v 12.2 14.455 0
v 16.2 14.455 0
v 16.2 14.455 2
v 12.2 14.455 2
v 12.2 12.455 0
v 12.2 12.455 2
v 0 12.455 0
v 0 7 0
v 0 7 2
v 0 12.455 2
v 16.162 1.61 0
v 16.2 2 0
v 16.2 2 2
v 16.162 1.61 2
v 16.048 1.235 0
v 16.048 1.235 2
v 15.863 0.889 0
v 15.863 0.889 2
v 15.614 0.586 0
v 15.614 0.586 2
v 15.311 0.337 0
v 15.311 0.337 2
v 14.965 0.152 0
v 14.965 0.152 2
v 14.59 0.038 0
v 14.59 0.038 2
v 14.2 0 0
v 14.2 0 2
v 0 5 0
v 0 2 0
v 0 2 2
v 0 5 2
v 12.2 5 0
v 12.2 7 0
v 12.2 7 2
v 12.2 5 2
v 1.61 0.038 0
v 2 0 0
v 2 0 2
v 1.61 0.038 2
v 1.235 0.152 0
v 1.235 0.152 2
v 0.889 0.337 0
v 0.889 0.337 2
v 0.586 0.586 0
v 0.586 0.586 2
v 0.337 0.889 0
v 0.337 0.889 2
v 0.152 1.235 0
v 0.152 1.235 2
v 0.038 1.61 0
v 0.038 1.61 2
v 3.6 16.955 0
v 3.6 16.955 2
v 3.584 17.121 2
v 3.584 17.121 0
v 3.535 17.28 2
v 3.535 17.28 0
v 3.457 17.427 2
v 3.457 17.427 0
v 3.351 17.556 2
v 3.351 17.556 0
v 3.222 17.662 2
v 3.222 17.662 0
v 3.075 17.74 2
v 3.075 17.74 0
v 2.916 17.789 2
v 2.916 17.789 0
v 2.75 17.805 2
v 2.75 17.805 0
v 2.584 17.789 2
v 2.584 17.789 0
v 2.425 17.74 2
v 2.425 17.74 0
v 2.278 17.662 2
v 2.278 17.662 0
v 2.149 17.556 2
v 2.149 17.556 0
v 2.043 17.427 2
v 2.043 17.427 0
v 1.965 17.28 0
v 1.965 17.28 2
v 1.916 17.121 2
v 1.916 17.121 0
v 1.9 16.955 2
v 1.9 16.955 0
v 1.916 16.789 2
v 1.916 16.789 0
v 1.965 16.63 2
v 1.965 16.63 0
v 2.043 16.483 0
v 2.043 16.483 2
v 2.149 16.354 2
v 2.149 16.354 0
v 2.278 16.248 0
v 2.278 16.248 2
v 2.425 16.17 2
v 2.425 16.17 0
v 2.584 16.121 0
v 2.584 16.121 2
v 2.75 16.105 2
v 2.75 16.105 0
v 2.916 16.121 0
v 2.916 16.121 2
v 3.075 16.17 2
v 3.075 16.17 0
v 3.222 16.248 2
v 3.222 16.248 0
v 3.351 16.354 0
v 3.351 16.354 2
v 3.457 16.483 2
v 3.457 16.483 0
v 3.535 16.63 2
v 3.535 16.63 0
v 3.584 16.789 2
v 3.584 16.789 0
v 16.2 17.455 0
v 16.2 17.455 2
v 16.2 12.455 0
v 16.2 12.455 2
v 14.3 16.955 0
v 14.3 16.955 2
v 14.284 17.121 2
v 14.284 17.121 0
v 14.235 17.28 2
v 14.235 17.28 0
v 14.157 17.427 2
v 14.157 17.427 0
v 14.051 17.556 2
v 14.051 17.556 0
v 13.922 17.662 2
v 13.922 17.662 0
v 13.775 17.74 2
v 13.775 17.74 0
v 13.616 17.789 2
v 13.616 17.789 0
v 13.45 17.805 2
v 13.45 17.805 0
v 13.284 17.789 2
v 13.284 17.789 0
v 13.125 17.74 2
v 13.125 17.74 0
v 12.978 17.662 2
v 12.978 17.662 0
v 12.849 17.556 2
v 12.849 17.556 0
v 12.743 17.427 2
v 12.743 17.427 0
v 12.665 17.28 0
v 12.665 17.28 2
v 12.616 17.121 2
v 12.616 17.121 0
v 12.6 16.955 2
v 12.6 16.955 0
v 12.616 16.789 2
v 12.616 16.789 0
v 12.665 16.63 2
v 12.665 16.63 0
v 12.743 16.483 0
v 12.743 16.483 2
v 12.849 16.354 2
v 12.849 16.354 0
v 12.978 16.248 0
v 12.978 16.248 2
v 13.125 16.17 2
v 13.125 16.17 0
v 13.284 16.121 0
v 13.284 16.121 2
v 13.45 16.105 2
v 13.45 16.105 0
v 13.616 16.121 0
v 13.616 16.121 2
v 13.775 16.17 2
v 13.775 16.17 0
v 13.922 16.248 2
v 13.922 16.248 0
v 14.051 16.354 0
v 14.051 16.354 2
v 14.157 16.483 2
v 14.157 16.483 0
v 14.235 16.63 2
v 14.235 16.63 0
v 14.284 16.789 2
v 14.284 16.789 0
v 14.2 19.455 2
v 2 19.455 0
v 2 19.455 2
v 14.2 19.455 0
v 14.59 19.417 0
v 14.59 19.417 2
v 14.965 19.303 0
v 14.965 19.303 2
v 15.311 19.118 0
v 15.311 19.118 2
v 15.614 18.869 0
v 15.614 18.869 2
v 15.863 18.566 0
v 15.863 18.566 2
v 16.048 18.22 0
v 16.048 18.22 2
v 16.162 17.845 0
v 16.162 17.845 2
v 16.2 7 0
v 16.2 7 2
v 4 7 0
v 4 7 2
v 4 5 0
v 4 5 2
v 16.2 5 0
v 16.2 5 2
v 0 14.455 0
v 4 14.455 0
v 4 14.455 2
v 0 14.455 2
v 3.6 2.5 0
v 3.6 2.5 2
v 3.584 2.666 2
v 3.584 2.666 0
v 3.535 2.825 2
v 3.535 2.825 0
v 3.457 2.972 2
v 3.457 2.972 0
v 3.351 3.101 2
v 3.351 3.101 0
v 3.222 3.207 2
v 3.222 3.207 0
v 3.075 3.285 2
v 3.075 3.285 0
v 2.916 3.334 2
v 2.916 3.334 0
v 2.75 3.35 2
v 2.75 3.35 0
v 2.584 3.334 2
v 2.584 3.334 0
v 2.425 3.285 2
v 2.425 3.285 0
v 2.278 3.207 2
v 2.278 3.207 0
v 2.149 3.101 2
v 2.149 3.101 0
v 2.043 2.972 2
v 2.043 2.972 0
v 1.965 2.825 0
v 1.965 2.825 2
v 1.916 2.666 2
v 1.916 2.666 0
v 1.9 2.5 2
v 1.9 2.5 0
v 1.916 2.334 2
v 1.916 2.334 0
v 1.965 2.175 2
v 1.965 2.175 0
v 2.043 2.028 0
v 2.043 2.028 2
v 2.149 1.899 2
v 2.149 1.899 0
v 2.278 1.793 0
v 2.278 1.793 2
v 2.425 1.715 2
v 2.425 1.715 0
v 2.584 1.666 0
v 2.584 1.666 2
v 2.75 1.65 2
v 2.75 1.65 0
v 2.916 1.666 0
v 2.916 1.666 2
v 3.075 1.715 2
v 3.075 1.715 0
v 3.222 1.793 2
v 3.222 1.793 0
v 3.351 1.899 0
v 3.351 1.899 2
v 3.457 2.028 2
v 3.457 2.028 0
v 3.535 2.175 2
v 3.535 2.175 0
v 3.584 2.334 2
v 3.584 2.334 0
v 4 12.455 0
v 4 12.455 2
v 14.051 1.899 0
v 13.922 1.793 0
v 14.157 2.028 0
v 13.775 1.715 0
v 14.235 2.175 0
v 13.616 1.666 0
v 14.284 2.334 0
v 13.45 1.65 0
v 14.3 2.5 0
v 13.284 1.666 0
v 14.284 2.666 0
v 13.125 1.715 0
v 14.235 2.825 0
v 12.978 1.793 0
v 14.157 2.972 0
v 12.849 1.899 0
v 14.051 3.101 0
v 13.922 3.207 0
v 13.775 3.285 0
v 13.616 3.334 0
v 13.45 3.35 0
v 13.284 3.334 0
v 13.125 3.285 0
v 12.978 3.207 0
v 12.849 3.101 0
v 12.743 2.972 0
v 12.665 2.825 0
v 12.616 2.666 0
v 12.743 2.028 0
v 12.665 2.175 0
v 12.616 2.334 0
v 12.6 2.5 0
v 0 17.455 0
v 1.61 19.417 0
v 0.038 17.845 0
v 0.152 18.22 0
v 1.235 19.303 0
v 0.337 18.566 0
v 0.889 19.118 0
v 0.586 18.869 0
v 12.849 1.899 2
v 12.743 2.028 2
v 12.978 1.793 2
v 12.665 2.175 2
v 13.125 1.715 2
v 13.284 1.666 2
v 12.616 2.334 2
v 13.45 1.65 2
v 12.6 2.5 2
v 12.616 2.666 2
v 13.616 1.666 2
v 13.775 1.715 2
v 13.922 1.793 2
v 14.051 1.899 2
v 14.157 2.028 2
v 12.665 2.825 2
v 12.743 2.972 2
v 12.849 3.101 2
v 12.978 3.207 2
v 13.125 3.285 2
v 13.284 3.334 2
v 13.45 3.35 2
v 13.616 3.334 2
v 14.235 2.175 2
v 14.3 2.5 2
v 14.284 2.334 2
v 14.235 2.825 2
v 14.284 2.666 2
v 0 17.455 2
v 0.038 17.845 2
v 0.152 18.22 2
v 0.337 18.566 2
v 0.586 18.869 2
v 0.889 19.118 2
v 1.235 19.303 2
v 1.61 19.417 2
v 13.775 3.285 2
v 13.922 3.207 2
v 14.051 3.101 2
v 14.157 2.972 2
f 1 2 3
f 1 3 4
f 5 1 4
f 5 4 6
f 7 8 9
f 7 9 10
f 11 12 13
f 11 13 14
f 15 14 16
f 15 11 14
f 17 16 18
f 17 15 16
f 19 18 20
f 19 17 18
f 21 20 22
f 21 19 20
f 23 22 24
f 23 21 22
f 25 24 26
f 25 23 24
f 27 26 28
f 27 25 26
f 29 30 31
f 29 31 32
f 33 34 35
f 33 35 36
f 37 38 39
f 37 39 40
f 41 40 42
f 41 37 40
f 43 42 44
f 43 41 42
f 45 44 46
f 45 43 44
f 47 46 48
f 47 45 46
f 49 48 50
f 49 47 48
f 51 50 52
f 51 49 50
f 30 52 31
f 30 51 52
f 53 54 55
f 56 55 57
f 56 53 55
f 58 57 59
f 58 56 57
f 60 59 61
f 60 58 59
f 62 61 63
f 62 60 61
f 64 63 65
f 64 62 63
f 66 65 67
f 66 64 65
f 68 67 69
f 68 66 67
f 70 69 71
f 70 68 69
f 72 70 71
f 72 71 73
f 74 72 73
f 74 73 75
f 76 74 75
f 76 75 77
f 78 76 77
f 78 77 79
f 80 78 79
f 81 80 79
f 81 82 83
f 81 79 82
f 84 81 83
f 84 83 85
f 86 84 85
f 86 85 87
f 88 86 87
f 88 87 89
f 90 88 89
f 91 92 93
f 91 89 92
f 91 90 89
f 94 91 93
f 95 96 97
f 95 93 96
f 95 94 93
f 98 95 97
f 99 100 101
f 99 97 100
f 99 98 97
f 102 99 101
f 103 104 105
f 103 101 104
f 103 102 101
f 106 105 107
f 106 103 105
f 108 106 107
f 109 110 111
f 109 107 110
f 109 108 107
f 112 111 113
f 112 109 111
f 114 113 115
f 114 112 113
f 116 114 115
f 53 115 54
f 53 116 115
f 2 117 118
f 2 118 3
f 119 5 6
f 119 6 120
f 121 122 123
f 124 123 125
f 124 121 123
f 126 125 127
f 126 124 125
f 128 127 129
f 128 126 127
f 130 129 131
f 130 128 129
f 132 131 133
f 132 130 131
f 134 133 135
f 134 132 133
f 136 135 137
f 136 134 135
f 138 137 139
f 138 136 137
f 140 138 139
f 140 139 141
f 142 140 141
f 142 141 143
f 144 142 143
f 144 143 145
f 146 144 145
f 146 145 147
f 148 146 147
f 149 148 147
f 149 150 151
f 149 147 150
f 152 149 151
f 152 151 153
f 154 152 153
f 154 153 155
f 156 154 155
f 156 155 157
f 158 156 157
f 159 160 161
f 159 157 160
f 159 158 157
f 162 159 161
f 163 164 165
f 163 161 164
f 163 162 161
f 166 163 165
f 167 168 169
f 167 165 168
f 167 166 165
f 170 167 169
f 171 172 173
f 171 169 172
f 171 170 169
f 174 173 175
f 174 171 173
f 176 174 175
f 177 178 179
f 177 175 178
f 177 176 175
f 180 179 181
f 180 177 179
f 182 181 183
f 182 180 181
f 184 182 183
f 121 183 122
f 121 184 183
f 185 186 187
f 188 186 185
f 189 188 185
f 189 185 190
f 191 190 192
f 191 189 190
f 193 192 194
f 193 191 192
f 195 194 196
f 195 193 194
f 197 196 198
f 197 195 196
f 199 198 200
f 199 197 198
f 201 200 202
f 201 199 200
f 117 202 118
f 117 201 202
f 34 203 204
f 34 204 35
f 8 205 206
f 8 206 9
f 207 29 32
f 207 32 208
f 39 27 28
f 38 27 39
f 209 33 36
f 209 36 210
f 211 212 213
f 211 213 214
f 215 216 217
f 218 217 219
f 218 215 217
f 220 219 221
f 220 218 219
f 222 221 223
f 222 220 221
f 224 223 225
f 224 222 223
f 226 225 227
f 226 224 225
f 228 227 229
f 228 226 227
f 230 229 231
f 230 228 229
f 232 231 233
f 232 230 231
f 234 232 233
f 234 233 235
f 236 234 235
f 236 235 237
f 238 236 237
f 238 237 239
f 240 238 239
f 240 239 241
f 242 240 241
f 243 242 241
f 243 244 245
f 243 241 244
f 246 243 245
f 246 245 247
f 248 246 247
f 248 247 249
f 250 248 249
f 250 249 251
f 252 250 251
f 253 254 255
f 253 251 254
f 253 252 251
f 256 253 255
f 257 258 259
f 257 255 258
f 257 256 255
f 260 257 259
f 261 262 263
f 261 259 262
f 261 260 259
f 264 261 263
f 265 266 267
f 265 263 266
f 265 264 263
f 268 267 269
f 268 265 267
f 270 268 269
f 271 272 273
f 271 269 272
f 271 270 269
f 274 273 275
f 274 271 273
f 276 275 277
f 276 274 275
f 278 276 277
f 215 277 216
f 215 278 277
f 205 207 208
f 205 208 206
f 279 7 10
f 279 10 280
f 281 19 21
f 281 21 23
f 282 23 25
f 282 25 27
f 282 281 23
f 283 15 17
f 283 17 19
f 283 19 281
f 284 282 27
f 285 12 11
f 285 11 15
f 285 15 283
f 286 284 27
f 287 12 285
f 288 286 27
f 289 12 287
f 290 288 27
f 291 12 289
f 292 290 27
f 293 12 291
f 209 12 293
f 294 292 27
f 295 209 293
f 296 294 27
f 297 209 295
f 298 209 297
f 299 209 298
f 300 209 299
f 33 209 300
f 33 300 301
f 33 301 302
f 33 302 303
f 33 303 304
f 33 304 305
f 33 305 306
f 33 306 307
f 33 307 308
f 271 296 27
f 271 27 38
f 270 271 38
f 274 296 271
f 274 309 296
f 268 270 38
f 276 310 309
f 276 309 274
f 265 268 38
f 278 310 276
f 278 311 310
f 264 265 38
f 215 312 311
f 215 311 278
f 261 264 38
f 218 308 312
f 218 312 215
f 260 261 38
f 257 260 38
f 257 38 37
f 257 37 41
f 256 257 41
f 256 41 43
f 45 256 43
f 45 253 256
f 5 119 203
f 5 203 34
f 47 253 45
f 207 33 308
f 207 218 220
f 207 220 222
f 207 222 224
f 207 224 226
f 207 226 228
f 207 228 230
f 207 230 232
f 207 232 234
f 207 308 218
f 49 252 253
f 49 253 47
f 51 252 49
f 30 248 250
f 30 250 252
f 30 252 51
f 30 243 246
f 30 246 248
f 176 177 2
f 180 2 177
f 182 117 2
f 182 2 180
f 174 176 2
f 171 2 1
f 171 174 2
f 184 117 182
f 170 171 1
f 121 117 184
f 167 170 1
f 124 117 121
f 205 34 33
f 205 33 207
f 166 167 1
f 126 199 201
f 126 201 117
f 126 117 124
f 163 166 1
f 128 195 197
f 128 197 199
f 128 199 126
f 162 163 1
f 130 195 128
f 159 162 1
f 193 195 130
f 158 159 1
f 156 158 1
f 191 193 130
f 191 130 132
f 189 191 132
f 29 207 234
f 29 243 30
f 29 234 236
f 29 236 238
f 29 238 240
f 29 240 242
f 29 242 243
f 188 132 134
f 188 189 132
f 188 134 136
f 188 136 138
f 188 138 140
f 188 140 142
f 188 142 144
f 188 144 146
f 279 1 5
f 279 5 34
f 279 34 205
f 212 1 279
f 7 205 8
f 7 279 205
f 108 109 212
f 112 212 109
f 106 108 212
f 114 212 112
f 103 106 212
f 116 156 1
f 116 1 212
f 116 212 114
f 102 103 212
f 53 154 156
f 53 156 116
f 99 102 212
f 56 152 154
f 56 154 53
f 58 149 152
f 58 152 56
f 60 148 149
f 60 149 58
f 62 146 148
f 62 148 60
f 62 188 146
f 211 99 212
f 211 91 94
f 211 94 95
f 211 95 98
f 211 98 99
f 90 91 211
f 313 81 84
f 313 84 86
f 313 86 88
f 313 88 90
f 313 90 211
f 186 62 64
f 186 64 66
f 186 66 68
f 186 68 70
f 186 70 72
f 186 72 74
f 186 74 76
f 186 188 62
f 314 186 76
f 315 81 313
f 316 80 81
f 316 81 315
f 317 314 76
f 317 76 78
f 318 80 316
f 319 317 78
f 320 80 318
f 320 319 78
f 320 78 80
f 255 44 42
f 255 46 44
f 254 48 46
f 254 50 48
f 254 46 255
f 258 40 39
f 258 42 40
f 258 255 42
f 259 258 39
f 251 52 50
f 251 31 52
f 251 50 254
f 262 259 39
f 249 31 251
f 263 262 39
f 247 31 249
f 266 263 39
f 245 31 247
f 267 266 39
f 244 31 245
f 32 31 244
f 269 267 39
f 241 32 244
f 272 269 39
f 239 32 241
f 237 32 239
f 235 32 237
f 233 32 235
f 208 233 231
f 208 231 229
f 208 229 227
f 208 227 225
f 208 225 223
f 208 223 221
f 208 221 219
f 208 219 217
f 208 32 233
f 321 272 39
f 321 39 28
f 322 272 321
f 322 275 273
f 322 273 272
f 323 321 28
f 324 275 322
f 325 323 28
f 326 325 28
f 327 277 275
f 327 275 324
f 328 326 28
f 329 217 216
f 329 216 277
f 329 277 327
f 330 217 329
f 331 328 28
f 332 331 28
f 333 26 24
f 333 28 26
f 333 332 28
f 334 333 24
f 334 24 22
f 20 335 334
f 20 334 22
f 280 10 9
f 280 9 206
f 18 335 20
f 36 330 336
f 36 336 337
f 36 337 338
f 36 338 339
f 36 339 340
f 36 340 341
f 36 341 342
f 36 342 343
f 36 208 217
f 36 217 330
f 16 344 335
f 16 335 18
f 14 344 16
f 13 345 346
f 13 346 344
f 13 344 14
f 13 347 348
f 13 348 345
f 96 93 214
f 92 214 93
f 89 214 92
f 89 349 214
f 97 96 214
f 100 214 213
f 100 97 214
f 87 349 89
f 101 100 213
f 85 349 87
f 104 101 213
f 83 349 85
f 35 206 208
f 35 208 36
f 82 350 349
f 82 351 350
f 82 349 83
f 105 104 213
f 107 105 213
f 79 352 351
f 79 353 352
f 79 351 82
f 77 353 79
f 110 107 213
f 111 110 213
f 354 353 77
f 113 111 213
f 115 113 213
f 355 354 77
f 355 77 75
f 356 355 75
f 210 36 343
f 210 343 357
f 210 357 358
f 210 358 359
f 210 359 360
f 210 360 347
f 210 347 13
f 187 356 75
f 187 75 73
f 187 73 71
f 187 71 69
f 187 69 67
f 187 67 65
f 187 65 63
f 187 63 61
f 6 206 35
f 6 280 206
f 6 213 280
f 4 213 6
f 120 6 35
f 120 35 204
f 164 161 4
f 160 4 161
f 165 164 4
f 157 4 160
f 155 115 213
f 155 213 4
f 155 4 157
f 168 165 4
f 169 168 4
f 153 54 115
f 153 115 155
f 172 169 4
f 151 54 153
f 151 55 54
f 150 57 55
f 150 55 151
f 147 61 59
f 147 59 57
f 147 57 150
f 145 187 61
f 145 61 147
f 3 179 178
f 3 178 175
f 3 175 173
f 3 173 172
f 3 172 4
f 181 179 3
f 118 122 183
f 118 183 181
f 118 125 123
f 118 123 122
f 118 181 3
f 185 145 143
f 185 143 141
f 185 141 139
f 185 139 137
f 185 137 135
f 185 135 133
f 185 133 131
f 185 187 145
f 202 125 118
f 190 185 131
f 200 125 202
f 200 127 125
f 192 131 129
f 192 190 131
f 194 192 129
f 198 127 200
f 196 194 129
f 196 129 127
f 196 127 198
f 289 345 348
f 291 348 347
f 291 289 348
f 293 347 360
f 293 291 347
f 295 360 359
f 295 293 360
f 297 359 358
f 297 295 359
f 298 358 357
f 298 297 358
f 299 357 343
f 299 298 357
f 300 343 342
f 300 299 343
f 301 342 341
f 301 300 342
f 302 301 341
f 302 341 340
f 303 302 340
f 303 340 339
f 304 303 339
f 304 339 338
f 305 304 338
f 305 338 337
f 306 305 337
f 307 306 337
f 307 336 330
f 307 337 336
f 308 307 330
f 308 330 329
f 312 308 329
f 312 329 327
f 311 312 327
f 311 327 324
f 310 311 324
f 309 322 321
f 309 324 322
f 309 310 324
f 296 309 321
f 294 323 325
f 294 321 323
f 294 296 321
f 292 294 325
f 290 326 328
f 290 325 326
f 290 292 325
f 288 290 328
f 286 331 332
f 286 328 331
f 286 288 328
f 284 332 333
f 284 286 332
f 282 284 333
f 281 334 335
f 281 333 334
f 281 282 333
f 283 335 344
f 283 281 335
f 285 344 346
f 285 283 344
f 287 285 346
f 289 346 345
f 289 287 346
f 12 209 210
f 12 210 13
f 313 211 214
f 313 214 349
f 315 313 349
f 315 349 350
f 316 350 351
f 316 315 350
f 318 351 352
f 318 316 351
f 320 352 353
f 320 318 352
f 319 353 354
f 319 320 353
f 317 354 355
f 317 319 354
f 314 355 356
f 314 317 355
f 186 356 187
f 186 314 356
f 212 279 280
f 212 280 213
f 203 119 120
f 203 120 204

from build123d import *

# Parameters (mm, degrees)
SKETCH2_R           = 0.85
BOSS_EXTRUDE1_DEPTH = 4
SKETCH3_W           = 16.2
SKETCH3_H           = 19.455
CUT_EXTRUDE1_DEPTH  = 2


with BuildPart() as part:
    # Sketch2 → Boss-Extrude1 (new body)
    with BuildSketch(Plane.XY):
        with BuildLine():
            Line((0, 7), (0, 12.455))
            Line((0, 12.455), (4, 12.455))
            Line((4, 12.455), (4, 14.455))
            Line((4, 14.455), (0, 14.455))
            Line((0, 14.455), (0, 17.455))
            ThreePointArc((0, 17.455), (0.585786438, 18.869213562), (2, 19.455))
            Line((2, 19.455), (14.2, 19.455))
            ThreePointArc((14.2, 19.455), (15.614213562, 18.869213562), (16.2, 17.455))
            Line((16.2, 17.455), (16.2, 14.455))
            Line((16.2, 14.455), (12.2, 14.455))
            Line((12.2, 14.455), (12.2, 12.455))
            Line((12.2, 12.455), (16.2, 12.455))
            Line((16.2, 12.455), (16.2, 7))
            Line((16.2, 7), (12.2, 7))
            Line((12.2, 7), (12.2, 5))
            Line((12.2, 5), (16.2, 5))
            Line((16.2, 5), (16.2, 2))
            ThreePointArc((16.2, 2), (15.614213562, 0.585786438), (14.2, 0))
            Line((14.2, 0), (2, 0))
            ThreePointArc((2, 0), (0.585786438, 0.585786438), (0, 2))
            Line((0, 2), (0, 5))
            Line((0, 5), (4, 5))
            Line((4, 5), (4, 7))
            Line((4, 7), (0, 7))
        make_face()
        with Locations((13.45, 2.5)):
            Circle(SKETCH2_R, mode=Mode.SUBTRACT)
        with Locations((2.75, 16.955)):
            Circle(SKETCH2_R, mode=Mode.SUBTRACT)
        with Locations((2.75, 2.5)):
            Circle(SKETCH2_R, mode=Mode.SUBTRACT)
        with Locations((13.45, 16.955)):
            Circle(SKETCH2_R, mode=Mode.SUBTRACT)
    extrude(amount=BOSS_EXTRUDE1_DEPTH)

    # Sketch3 → Cut-Extrude1 (cut)
    with BuildSketch(Plane.XY.offset(4)):
        with Locations((8.1, 9.7275)):
            Rectangle(SKETCH3_W, SKETCH3_H)
    extrude(amount=-CUT_EXTRUDE1_DEPTH, mode=Mode.SUBTRACT)


solid = part.part
